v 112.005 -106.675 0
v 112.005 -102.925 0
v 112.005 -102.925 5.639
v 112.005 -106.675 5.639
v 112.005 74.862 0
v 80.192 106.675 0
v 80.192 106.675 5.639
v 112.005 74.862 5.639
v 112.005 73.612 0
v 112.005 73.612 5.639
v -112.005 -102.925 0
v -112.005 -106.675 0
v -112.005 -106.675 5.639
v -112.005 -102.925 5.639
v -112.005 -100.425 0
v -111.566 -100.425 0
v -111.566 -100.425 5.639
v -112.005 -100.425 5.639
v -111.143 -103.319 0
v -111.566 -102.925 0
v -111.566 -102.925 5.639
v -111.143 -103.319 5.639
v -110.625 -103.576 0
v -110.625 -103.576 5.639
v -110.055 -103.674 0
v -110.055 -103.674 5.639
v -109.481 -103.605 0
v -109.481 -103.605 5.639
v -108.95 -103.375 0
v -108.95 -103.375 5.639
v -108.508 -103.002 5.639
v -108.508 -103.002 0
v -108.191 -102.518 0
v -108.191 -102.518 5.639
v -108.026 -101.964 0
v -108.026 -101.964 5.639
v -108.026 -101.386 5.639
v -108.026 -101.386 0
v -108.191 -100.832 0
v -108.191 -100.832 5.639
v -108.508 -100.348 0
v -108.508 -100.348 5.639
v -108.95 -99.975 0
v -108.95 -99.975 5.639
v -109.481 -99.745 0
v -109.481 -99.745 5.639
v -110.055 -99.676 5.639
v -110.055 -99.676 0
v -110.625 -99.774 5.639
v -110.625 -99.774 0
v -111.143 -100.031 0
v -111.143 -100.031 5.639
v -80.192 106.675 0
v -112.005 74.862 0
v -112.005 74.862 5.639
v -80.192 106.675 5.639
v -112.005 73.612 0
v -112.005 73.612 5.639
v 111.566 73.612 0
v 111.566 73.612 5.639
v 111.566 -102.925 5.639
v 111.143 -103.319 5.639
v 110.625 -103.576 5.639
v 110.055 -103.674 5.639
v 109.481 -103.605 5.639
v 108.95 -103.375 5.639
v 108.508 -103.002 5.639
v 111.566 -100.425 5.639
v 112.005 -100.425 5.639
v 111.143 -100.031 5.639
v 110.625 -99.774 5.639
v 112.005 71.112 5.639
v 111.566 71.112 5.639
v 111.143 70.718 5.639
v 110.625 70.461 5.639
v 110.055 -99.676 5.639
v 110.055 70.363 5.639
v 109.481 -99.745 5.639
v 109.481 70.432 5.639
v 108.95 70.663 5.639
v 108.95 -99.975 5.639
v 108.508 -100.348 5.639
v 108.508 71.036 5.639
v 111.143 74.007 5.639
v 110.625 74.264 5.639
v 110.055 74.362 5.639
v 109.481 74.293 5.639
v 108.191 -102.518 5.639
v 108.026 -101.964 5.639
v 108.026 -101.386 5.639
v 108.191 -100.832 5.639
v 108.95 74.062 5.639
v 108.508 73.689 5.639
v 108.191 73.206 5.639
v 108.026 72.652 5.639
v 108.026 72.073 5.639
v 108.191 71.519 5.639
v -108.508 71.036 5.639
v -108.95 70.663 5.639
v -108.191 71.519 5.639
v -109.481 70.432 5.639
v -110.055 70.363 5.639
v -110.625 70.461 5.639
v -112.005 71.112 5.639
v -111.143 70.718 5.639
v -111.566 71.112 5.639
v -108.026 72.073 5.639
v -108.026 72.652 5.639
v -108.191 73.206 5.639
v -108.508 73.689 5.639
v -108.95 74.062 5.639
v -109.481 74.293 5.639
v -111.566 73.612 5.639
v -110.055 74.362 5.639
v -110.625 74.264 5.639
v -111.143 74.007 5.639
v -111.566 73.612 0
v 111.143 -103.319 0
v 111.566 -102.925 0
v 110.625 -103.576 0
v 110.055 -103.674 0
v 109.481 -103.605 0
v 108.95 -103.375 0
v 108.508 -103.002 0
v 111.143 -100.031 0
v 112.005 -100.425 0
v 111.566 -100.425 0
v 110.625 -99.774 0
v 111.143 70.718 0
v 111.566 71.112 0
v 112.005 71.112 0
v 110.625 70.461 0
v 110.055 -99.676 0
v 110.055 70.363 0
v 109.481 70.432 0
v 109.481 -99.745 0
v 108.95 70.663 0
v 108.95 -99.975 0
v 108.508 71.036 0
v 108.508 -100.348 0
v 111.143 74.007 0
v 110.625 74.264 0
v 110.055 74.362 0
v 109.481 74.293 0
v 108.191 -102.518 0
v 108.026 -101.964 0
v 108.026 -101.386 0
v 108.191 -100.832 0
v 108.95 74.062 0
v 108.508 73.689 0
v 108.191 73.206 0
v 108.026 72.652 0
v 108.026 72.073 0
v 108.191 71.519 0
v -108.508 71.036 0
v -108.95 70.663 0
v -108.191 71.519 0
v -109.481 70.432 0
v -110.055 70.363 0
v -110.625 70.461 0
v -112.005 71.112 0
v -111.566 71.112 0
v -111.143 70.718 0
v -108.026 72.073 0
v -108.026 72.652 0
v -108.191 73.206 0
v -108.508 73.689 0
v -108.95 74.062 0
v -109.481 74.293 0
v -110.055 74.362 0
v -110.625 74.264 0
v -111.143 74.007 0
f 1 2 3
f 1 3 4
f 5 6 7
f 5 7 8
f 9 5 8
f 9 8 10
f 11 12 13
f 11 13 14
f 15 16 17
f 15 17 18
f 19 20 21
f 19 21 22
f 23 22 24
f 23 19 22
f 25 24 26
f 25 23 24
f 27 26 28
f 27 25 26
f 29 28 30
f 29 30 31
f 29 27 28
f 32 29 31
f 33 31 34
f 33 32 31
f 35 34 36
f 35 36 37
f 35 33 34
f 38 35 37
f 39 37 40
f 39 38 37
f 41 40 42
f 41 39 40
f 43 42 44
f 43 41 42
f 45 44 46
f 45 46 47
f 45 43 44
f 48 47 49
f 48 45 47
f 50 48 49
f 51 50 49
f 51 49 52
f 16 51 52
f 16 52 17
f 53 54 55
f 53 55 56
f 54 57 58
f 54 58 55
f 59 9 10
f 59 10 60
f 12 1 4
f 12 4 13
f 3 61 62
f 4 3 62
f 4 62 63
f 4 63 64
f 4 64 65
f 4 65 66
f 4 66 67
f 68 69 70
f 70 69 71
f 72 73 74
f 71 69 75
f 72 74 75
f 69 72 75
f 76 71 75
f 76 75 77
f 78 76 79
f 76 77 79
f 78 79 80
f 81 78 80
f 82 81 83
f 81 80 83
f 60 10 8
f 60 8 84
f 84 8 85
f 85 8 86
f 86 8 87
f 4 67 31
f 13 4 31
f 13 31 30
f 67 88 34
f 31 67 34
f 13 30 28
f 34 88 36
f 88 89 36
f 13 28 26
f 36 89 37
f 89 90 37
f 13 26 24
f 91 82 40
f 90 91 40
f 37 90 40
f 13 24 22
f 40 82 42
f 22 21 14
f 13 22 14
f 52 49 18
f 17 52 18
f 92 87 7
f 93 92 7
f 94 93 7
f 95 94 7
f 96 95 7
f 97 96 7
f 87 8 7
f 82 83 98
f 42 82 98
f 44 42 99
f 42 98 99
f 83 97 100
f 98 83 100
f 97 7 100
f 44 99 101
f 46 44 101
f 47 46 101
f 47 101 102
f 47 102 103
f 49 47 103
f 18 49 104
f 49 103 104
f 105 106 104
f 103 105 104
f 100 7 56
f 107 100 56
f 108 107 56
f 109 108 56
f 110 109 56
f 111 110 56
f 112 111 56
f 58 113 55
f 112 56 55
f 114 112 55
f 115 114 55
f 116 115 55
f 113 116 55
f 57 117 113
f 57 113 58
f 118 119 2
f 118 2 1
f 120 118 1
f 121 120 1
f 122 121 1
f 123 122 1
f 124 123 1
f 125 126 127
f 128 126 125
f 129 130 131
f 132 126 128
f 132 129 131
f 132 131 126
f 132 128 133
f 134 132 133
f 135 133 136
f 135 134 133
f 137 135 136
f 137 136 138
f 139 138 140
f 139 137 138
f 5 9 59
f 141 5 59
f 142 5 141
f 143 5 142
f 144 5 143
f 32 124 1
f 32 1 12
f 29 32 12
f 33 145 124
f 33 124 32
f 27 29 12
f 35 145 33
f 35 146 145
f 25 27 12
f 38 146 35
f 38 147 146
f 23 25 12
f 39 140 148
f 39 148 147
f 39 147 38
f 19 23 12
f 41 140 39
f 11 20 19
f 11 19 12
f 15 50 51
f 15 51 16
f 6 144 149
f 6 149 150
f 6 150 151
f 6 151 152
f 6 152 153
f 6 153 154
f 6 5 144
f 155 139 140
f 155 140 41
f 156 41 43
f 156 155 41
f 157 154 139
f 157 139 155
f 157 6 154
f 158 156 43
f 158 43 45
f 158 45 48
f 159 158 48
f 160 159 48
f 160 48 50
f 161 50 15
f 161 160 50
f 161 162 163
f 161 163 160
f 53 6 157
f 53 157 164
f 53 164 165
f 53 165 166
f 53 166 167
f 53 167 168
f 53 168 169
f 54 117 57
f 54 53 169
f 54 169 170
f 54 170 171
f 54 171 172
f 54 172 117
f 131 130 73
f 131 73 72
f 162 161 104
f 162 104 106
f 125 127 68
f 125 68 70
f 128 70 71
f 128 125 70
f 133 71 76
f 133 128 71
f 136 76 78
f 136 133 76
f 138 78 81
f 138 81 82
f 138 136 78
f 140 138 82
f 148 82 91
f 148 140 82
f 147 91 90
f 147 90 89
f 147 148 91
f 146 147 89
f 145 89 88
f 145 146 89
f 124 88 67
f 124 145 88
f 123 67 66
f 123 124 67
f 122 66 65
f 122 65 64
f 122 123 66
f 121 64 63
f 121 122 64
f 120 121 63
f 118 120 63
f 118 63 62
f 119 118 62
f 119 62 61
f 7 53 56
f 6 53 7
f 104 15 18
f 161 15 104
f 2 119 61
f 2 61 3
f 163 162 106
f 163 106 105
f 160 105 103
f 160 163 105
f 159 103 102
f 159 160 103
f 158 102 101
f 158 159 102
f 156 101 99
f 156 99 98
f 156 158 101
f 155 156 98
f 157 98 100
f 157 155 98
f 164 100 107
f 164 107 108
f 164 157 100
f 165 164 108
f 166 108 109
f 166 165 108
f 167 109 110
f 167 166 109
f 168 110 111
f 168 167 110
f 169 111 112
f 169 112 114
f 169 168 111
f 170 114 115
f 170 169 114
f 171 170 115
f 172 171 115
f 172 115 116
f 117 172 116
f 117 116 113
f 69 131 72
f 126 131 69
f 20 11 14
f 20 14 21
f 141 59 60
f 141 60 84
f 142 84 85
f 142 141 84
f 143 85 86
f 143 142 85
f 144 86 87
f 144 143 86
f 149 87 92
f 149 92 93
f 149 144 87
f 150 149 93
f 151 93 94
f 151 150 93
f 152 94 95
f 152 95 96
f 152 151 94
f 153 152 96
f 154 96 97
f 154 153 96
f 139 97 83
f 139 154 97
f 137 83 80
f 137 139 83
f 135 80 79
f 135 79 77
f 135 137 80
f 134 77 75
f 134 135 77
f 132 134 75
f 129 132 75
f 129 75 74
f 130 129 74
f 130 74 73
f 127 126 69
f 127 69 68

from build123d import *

# Parameters (mm, degrees)
BOSS_EXTRUDE1_DEPTH = 5.6388


with BuildPart() as part:
    # Sketch5 → Boss-Extrude1 (new body)
    with BuildSketch(Plane.XY):
        with BuildLine():
            Line((-111.565879557, 73.61243575), (-112.004630057, 73.61243575))
            Line((-112.004630057, 73.61243575), (-112.004630057, 74.86243575))
            Line((-112.004630057, 74.86243575), (-80.192037686, 106.675))
            Line((-80.192037686, 106.675), (80.192037686, 106.675))
            Line((80.192037686, 106.675), (112.004630057, 74.86243575))
            Line((112.004630057, 74.86243575), (112.004630057, 73.61243575))
            Line((112.004630057, 73.61243575), (111.565879557, 73.61243575))
            ThreePointArc((111.565879557, 73.61243575), (108.004630057, 72.36243575), (111.565879557, 71.11243575))
            Line((111.565879557, 71.11243575), (112.004630057, 71.11243575))
            Line((112.004630057, 71.11243575), (112.004630057, -100.425))
            Line((112.004630057, -100.425), (111.565879557, -100.425))
            ThreePointArc((111.565879557, -100.425), (108.004630057, -101.675), (111.565879557, -102.925))
            Line((111.565879557, -102.925), (112.004630057, -102.925))
            Line((112.004630057, -102.925), (112.004630057, -106.675))
            Line((112.004630057, -106.675), (-112.004630057, -106.675))
            Line((-112.004630057, -106.675), (-112.004630057, -102.925))
            Line((-112.004630057, -102.925), (-111.565879557, -102.925))
            ThreePointArc((-111.565879557, -102.925), (-108.004630057, -101.675), (-111.565879557, -100.425))
            Line((-111.565879557, -100.425), (-112.004630057, -100.425))
            Line((-112.004630057, -100.425), (-112.004630057, 71.11243575))
            Line((-112.004630057, 71.11243575), (-111.565879557, 71.11243575))
            ThreePointArc((-111.565879557, 71.11243575), (-108.004630057, 72.36243575), (-111.565879557, 73.61243575))
        make_face()
    extrude(amount=BOSS_EXTRUDE1_DEPTH)


solid = part.part
